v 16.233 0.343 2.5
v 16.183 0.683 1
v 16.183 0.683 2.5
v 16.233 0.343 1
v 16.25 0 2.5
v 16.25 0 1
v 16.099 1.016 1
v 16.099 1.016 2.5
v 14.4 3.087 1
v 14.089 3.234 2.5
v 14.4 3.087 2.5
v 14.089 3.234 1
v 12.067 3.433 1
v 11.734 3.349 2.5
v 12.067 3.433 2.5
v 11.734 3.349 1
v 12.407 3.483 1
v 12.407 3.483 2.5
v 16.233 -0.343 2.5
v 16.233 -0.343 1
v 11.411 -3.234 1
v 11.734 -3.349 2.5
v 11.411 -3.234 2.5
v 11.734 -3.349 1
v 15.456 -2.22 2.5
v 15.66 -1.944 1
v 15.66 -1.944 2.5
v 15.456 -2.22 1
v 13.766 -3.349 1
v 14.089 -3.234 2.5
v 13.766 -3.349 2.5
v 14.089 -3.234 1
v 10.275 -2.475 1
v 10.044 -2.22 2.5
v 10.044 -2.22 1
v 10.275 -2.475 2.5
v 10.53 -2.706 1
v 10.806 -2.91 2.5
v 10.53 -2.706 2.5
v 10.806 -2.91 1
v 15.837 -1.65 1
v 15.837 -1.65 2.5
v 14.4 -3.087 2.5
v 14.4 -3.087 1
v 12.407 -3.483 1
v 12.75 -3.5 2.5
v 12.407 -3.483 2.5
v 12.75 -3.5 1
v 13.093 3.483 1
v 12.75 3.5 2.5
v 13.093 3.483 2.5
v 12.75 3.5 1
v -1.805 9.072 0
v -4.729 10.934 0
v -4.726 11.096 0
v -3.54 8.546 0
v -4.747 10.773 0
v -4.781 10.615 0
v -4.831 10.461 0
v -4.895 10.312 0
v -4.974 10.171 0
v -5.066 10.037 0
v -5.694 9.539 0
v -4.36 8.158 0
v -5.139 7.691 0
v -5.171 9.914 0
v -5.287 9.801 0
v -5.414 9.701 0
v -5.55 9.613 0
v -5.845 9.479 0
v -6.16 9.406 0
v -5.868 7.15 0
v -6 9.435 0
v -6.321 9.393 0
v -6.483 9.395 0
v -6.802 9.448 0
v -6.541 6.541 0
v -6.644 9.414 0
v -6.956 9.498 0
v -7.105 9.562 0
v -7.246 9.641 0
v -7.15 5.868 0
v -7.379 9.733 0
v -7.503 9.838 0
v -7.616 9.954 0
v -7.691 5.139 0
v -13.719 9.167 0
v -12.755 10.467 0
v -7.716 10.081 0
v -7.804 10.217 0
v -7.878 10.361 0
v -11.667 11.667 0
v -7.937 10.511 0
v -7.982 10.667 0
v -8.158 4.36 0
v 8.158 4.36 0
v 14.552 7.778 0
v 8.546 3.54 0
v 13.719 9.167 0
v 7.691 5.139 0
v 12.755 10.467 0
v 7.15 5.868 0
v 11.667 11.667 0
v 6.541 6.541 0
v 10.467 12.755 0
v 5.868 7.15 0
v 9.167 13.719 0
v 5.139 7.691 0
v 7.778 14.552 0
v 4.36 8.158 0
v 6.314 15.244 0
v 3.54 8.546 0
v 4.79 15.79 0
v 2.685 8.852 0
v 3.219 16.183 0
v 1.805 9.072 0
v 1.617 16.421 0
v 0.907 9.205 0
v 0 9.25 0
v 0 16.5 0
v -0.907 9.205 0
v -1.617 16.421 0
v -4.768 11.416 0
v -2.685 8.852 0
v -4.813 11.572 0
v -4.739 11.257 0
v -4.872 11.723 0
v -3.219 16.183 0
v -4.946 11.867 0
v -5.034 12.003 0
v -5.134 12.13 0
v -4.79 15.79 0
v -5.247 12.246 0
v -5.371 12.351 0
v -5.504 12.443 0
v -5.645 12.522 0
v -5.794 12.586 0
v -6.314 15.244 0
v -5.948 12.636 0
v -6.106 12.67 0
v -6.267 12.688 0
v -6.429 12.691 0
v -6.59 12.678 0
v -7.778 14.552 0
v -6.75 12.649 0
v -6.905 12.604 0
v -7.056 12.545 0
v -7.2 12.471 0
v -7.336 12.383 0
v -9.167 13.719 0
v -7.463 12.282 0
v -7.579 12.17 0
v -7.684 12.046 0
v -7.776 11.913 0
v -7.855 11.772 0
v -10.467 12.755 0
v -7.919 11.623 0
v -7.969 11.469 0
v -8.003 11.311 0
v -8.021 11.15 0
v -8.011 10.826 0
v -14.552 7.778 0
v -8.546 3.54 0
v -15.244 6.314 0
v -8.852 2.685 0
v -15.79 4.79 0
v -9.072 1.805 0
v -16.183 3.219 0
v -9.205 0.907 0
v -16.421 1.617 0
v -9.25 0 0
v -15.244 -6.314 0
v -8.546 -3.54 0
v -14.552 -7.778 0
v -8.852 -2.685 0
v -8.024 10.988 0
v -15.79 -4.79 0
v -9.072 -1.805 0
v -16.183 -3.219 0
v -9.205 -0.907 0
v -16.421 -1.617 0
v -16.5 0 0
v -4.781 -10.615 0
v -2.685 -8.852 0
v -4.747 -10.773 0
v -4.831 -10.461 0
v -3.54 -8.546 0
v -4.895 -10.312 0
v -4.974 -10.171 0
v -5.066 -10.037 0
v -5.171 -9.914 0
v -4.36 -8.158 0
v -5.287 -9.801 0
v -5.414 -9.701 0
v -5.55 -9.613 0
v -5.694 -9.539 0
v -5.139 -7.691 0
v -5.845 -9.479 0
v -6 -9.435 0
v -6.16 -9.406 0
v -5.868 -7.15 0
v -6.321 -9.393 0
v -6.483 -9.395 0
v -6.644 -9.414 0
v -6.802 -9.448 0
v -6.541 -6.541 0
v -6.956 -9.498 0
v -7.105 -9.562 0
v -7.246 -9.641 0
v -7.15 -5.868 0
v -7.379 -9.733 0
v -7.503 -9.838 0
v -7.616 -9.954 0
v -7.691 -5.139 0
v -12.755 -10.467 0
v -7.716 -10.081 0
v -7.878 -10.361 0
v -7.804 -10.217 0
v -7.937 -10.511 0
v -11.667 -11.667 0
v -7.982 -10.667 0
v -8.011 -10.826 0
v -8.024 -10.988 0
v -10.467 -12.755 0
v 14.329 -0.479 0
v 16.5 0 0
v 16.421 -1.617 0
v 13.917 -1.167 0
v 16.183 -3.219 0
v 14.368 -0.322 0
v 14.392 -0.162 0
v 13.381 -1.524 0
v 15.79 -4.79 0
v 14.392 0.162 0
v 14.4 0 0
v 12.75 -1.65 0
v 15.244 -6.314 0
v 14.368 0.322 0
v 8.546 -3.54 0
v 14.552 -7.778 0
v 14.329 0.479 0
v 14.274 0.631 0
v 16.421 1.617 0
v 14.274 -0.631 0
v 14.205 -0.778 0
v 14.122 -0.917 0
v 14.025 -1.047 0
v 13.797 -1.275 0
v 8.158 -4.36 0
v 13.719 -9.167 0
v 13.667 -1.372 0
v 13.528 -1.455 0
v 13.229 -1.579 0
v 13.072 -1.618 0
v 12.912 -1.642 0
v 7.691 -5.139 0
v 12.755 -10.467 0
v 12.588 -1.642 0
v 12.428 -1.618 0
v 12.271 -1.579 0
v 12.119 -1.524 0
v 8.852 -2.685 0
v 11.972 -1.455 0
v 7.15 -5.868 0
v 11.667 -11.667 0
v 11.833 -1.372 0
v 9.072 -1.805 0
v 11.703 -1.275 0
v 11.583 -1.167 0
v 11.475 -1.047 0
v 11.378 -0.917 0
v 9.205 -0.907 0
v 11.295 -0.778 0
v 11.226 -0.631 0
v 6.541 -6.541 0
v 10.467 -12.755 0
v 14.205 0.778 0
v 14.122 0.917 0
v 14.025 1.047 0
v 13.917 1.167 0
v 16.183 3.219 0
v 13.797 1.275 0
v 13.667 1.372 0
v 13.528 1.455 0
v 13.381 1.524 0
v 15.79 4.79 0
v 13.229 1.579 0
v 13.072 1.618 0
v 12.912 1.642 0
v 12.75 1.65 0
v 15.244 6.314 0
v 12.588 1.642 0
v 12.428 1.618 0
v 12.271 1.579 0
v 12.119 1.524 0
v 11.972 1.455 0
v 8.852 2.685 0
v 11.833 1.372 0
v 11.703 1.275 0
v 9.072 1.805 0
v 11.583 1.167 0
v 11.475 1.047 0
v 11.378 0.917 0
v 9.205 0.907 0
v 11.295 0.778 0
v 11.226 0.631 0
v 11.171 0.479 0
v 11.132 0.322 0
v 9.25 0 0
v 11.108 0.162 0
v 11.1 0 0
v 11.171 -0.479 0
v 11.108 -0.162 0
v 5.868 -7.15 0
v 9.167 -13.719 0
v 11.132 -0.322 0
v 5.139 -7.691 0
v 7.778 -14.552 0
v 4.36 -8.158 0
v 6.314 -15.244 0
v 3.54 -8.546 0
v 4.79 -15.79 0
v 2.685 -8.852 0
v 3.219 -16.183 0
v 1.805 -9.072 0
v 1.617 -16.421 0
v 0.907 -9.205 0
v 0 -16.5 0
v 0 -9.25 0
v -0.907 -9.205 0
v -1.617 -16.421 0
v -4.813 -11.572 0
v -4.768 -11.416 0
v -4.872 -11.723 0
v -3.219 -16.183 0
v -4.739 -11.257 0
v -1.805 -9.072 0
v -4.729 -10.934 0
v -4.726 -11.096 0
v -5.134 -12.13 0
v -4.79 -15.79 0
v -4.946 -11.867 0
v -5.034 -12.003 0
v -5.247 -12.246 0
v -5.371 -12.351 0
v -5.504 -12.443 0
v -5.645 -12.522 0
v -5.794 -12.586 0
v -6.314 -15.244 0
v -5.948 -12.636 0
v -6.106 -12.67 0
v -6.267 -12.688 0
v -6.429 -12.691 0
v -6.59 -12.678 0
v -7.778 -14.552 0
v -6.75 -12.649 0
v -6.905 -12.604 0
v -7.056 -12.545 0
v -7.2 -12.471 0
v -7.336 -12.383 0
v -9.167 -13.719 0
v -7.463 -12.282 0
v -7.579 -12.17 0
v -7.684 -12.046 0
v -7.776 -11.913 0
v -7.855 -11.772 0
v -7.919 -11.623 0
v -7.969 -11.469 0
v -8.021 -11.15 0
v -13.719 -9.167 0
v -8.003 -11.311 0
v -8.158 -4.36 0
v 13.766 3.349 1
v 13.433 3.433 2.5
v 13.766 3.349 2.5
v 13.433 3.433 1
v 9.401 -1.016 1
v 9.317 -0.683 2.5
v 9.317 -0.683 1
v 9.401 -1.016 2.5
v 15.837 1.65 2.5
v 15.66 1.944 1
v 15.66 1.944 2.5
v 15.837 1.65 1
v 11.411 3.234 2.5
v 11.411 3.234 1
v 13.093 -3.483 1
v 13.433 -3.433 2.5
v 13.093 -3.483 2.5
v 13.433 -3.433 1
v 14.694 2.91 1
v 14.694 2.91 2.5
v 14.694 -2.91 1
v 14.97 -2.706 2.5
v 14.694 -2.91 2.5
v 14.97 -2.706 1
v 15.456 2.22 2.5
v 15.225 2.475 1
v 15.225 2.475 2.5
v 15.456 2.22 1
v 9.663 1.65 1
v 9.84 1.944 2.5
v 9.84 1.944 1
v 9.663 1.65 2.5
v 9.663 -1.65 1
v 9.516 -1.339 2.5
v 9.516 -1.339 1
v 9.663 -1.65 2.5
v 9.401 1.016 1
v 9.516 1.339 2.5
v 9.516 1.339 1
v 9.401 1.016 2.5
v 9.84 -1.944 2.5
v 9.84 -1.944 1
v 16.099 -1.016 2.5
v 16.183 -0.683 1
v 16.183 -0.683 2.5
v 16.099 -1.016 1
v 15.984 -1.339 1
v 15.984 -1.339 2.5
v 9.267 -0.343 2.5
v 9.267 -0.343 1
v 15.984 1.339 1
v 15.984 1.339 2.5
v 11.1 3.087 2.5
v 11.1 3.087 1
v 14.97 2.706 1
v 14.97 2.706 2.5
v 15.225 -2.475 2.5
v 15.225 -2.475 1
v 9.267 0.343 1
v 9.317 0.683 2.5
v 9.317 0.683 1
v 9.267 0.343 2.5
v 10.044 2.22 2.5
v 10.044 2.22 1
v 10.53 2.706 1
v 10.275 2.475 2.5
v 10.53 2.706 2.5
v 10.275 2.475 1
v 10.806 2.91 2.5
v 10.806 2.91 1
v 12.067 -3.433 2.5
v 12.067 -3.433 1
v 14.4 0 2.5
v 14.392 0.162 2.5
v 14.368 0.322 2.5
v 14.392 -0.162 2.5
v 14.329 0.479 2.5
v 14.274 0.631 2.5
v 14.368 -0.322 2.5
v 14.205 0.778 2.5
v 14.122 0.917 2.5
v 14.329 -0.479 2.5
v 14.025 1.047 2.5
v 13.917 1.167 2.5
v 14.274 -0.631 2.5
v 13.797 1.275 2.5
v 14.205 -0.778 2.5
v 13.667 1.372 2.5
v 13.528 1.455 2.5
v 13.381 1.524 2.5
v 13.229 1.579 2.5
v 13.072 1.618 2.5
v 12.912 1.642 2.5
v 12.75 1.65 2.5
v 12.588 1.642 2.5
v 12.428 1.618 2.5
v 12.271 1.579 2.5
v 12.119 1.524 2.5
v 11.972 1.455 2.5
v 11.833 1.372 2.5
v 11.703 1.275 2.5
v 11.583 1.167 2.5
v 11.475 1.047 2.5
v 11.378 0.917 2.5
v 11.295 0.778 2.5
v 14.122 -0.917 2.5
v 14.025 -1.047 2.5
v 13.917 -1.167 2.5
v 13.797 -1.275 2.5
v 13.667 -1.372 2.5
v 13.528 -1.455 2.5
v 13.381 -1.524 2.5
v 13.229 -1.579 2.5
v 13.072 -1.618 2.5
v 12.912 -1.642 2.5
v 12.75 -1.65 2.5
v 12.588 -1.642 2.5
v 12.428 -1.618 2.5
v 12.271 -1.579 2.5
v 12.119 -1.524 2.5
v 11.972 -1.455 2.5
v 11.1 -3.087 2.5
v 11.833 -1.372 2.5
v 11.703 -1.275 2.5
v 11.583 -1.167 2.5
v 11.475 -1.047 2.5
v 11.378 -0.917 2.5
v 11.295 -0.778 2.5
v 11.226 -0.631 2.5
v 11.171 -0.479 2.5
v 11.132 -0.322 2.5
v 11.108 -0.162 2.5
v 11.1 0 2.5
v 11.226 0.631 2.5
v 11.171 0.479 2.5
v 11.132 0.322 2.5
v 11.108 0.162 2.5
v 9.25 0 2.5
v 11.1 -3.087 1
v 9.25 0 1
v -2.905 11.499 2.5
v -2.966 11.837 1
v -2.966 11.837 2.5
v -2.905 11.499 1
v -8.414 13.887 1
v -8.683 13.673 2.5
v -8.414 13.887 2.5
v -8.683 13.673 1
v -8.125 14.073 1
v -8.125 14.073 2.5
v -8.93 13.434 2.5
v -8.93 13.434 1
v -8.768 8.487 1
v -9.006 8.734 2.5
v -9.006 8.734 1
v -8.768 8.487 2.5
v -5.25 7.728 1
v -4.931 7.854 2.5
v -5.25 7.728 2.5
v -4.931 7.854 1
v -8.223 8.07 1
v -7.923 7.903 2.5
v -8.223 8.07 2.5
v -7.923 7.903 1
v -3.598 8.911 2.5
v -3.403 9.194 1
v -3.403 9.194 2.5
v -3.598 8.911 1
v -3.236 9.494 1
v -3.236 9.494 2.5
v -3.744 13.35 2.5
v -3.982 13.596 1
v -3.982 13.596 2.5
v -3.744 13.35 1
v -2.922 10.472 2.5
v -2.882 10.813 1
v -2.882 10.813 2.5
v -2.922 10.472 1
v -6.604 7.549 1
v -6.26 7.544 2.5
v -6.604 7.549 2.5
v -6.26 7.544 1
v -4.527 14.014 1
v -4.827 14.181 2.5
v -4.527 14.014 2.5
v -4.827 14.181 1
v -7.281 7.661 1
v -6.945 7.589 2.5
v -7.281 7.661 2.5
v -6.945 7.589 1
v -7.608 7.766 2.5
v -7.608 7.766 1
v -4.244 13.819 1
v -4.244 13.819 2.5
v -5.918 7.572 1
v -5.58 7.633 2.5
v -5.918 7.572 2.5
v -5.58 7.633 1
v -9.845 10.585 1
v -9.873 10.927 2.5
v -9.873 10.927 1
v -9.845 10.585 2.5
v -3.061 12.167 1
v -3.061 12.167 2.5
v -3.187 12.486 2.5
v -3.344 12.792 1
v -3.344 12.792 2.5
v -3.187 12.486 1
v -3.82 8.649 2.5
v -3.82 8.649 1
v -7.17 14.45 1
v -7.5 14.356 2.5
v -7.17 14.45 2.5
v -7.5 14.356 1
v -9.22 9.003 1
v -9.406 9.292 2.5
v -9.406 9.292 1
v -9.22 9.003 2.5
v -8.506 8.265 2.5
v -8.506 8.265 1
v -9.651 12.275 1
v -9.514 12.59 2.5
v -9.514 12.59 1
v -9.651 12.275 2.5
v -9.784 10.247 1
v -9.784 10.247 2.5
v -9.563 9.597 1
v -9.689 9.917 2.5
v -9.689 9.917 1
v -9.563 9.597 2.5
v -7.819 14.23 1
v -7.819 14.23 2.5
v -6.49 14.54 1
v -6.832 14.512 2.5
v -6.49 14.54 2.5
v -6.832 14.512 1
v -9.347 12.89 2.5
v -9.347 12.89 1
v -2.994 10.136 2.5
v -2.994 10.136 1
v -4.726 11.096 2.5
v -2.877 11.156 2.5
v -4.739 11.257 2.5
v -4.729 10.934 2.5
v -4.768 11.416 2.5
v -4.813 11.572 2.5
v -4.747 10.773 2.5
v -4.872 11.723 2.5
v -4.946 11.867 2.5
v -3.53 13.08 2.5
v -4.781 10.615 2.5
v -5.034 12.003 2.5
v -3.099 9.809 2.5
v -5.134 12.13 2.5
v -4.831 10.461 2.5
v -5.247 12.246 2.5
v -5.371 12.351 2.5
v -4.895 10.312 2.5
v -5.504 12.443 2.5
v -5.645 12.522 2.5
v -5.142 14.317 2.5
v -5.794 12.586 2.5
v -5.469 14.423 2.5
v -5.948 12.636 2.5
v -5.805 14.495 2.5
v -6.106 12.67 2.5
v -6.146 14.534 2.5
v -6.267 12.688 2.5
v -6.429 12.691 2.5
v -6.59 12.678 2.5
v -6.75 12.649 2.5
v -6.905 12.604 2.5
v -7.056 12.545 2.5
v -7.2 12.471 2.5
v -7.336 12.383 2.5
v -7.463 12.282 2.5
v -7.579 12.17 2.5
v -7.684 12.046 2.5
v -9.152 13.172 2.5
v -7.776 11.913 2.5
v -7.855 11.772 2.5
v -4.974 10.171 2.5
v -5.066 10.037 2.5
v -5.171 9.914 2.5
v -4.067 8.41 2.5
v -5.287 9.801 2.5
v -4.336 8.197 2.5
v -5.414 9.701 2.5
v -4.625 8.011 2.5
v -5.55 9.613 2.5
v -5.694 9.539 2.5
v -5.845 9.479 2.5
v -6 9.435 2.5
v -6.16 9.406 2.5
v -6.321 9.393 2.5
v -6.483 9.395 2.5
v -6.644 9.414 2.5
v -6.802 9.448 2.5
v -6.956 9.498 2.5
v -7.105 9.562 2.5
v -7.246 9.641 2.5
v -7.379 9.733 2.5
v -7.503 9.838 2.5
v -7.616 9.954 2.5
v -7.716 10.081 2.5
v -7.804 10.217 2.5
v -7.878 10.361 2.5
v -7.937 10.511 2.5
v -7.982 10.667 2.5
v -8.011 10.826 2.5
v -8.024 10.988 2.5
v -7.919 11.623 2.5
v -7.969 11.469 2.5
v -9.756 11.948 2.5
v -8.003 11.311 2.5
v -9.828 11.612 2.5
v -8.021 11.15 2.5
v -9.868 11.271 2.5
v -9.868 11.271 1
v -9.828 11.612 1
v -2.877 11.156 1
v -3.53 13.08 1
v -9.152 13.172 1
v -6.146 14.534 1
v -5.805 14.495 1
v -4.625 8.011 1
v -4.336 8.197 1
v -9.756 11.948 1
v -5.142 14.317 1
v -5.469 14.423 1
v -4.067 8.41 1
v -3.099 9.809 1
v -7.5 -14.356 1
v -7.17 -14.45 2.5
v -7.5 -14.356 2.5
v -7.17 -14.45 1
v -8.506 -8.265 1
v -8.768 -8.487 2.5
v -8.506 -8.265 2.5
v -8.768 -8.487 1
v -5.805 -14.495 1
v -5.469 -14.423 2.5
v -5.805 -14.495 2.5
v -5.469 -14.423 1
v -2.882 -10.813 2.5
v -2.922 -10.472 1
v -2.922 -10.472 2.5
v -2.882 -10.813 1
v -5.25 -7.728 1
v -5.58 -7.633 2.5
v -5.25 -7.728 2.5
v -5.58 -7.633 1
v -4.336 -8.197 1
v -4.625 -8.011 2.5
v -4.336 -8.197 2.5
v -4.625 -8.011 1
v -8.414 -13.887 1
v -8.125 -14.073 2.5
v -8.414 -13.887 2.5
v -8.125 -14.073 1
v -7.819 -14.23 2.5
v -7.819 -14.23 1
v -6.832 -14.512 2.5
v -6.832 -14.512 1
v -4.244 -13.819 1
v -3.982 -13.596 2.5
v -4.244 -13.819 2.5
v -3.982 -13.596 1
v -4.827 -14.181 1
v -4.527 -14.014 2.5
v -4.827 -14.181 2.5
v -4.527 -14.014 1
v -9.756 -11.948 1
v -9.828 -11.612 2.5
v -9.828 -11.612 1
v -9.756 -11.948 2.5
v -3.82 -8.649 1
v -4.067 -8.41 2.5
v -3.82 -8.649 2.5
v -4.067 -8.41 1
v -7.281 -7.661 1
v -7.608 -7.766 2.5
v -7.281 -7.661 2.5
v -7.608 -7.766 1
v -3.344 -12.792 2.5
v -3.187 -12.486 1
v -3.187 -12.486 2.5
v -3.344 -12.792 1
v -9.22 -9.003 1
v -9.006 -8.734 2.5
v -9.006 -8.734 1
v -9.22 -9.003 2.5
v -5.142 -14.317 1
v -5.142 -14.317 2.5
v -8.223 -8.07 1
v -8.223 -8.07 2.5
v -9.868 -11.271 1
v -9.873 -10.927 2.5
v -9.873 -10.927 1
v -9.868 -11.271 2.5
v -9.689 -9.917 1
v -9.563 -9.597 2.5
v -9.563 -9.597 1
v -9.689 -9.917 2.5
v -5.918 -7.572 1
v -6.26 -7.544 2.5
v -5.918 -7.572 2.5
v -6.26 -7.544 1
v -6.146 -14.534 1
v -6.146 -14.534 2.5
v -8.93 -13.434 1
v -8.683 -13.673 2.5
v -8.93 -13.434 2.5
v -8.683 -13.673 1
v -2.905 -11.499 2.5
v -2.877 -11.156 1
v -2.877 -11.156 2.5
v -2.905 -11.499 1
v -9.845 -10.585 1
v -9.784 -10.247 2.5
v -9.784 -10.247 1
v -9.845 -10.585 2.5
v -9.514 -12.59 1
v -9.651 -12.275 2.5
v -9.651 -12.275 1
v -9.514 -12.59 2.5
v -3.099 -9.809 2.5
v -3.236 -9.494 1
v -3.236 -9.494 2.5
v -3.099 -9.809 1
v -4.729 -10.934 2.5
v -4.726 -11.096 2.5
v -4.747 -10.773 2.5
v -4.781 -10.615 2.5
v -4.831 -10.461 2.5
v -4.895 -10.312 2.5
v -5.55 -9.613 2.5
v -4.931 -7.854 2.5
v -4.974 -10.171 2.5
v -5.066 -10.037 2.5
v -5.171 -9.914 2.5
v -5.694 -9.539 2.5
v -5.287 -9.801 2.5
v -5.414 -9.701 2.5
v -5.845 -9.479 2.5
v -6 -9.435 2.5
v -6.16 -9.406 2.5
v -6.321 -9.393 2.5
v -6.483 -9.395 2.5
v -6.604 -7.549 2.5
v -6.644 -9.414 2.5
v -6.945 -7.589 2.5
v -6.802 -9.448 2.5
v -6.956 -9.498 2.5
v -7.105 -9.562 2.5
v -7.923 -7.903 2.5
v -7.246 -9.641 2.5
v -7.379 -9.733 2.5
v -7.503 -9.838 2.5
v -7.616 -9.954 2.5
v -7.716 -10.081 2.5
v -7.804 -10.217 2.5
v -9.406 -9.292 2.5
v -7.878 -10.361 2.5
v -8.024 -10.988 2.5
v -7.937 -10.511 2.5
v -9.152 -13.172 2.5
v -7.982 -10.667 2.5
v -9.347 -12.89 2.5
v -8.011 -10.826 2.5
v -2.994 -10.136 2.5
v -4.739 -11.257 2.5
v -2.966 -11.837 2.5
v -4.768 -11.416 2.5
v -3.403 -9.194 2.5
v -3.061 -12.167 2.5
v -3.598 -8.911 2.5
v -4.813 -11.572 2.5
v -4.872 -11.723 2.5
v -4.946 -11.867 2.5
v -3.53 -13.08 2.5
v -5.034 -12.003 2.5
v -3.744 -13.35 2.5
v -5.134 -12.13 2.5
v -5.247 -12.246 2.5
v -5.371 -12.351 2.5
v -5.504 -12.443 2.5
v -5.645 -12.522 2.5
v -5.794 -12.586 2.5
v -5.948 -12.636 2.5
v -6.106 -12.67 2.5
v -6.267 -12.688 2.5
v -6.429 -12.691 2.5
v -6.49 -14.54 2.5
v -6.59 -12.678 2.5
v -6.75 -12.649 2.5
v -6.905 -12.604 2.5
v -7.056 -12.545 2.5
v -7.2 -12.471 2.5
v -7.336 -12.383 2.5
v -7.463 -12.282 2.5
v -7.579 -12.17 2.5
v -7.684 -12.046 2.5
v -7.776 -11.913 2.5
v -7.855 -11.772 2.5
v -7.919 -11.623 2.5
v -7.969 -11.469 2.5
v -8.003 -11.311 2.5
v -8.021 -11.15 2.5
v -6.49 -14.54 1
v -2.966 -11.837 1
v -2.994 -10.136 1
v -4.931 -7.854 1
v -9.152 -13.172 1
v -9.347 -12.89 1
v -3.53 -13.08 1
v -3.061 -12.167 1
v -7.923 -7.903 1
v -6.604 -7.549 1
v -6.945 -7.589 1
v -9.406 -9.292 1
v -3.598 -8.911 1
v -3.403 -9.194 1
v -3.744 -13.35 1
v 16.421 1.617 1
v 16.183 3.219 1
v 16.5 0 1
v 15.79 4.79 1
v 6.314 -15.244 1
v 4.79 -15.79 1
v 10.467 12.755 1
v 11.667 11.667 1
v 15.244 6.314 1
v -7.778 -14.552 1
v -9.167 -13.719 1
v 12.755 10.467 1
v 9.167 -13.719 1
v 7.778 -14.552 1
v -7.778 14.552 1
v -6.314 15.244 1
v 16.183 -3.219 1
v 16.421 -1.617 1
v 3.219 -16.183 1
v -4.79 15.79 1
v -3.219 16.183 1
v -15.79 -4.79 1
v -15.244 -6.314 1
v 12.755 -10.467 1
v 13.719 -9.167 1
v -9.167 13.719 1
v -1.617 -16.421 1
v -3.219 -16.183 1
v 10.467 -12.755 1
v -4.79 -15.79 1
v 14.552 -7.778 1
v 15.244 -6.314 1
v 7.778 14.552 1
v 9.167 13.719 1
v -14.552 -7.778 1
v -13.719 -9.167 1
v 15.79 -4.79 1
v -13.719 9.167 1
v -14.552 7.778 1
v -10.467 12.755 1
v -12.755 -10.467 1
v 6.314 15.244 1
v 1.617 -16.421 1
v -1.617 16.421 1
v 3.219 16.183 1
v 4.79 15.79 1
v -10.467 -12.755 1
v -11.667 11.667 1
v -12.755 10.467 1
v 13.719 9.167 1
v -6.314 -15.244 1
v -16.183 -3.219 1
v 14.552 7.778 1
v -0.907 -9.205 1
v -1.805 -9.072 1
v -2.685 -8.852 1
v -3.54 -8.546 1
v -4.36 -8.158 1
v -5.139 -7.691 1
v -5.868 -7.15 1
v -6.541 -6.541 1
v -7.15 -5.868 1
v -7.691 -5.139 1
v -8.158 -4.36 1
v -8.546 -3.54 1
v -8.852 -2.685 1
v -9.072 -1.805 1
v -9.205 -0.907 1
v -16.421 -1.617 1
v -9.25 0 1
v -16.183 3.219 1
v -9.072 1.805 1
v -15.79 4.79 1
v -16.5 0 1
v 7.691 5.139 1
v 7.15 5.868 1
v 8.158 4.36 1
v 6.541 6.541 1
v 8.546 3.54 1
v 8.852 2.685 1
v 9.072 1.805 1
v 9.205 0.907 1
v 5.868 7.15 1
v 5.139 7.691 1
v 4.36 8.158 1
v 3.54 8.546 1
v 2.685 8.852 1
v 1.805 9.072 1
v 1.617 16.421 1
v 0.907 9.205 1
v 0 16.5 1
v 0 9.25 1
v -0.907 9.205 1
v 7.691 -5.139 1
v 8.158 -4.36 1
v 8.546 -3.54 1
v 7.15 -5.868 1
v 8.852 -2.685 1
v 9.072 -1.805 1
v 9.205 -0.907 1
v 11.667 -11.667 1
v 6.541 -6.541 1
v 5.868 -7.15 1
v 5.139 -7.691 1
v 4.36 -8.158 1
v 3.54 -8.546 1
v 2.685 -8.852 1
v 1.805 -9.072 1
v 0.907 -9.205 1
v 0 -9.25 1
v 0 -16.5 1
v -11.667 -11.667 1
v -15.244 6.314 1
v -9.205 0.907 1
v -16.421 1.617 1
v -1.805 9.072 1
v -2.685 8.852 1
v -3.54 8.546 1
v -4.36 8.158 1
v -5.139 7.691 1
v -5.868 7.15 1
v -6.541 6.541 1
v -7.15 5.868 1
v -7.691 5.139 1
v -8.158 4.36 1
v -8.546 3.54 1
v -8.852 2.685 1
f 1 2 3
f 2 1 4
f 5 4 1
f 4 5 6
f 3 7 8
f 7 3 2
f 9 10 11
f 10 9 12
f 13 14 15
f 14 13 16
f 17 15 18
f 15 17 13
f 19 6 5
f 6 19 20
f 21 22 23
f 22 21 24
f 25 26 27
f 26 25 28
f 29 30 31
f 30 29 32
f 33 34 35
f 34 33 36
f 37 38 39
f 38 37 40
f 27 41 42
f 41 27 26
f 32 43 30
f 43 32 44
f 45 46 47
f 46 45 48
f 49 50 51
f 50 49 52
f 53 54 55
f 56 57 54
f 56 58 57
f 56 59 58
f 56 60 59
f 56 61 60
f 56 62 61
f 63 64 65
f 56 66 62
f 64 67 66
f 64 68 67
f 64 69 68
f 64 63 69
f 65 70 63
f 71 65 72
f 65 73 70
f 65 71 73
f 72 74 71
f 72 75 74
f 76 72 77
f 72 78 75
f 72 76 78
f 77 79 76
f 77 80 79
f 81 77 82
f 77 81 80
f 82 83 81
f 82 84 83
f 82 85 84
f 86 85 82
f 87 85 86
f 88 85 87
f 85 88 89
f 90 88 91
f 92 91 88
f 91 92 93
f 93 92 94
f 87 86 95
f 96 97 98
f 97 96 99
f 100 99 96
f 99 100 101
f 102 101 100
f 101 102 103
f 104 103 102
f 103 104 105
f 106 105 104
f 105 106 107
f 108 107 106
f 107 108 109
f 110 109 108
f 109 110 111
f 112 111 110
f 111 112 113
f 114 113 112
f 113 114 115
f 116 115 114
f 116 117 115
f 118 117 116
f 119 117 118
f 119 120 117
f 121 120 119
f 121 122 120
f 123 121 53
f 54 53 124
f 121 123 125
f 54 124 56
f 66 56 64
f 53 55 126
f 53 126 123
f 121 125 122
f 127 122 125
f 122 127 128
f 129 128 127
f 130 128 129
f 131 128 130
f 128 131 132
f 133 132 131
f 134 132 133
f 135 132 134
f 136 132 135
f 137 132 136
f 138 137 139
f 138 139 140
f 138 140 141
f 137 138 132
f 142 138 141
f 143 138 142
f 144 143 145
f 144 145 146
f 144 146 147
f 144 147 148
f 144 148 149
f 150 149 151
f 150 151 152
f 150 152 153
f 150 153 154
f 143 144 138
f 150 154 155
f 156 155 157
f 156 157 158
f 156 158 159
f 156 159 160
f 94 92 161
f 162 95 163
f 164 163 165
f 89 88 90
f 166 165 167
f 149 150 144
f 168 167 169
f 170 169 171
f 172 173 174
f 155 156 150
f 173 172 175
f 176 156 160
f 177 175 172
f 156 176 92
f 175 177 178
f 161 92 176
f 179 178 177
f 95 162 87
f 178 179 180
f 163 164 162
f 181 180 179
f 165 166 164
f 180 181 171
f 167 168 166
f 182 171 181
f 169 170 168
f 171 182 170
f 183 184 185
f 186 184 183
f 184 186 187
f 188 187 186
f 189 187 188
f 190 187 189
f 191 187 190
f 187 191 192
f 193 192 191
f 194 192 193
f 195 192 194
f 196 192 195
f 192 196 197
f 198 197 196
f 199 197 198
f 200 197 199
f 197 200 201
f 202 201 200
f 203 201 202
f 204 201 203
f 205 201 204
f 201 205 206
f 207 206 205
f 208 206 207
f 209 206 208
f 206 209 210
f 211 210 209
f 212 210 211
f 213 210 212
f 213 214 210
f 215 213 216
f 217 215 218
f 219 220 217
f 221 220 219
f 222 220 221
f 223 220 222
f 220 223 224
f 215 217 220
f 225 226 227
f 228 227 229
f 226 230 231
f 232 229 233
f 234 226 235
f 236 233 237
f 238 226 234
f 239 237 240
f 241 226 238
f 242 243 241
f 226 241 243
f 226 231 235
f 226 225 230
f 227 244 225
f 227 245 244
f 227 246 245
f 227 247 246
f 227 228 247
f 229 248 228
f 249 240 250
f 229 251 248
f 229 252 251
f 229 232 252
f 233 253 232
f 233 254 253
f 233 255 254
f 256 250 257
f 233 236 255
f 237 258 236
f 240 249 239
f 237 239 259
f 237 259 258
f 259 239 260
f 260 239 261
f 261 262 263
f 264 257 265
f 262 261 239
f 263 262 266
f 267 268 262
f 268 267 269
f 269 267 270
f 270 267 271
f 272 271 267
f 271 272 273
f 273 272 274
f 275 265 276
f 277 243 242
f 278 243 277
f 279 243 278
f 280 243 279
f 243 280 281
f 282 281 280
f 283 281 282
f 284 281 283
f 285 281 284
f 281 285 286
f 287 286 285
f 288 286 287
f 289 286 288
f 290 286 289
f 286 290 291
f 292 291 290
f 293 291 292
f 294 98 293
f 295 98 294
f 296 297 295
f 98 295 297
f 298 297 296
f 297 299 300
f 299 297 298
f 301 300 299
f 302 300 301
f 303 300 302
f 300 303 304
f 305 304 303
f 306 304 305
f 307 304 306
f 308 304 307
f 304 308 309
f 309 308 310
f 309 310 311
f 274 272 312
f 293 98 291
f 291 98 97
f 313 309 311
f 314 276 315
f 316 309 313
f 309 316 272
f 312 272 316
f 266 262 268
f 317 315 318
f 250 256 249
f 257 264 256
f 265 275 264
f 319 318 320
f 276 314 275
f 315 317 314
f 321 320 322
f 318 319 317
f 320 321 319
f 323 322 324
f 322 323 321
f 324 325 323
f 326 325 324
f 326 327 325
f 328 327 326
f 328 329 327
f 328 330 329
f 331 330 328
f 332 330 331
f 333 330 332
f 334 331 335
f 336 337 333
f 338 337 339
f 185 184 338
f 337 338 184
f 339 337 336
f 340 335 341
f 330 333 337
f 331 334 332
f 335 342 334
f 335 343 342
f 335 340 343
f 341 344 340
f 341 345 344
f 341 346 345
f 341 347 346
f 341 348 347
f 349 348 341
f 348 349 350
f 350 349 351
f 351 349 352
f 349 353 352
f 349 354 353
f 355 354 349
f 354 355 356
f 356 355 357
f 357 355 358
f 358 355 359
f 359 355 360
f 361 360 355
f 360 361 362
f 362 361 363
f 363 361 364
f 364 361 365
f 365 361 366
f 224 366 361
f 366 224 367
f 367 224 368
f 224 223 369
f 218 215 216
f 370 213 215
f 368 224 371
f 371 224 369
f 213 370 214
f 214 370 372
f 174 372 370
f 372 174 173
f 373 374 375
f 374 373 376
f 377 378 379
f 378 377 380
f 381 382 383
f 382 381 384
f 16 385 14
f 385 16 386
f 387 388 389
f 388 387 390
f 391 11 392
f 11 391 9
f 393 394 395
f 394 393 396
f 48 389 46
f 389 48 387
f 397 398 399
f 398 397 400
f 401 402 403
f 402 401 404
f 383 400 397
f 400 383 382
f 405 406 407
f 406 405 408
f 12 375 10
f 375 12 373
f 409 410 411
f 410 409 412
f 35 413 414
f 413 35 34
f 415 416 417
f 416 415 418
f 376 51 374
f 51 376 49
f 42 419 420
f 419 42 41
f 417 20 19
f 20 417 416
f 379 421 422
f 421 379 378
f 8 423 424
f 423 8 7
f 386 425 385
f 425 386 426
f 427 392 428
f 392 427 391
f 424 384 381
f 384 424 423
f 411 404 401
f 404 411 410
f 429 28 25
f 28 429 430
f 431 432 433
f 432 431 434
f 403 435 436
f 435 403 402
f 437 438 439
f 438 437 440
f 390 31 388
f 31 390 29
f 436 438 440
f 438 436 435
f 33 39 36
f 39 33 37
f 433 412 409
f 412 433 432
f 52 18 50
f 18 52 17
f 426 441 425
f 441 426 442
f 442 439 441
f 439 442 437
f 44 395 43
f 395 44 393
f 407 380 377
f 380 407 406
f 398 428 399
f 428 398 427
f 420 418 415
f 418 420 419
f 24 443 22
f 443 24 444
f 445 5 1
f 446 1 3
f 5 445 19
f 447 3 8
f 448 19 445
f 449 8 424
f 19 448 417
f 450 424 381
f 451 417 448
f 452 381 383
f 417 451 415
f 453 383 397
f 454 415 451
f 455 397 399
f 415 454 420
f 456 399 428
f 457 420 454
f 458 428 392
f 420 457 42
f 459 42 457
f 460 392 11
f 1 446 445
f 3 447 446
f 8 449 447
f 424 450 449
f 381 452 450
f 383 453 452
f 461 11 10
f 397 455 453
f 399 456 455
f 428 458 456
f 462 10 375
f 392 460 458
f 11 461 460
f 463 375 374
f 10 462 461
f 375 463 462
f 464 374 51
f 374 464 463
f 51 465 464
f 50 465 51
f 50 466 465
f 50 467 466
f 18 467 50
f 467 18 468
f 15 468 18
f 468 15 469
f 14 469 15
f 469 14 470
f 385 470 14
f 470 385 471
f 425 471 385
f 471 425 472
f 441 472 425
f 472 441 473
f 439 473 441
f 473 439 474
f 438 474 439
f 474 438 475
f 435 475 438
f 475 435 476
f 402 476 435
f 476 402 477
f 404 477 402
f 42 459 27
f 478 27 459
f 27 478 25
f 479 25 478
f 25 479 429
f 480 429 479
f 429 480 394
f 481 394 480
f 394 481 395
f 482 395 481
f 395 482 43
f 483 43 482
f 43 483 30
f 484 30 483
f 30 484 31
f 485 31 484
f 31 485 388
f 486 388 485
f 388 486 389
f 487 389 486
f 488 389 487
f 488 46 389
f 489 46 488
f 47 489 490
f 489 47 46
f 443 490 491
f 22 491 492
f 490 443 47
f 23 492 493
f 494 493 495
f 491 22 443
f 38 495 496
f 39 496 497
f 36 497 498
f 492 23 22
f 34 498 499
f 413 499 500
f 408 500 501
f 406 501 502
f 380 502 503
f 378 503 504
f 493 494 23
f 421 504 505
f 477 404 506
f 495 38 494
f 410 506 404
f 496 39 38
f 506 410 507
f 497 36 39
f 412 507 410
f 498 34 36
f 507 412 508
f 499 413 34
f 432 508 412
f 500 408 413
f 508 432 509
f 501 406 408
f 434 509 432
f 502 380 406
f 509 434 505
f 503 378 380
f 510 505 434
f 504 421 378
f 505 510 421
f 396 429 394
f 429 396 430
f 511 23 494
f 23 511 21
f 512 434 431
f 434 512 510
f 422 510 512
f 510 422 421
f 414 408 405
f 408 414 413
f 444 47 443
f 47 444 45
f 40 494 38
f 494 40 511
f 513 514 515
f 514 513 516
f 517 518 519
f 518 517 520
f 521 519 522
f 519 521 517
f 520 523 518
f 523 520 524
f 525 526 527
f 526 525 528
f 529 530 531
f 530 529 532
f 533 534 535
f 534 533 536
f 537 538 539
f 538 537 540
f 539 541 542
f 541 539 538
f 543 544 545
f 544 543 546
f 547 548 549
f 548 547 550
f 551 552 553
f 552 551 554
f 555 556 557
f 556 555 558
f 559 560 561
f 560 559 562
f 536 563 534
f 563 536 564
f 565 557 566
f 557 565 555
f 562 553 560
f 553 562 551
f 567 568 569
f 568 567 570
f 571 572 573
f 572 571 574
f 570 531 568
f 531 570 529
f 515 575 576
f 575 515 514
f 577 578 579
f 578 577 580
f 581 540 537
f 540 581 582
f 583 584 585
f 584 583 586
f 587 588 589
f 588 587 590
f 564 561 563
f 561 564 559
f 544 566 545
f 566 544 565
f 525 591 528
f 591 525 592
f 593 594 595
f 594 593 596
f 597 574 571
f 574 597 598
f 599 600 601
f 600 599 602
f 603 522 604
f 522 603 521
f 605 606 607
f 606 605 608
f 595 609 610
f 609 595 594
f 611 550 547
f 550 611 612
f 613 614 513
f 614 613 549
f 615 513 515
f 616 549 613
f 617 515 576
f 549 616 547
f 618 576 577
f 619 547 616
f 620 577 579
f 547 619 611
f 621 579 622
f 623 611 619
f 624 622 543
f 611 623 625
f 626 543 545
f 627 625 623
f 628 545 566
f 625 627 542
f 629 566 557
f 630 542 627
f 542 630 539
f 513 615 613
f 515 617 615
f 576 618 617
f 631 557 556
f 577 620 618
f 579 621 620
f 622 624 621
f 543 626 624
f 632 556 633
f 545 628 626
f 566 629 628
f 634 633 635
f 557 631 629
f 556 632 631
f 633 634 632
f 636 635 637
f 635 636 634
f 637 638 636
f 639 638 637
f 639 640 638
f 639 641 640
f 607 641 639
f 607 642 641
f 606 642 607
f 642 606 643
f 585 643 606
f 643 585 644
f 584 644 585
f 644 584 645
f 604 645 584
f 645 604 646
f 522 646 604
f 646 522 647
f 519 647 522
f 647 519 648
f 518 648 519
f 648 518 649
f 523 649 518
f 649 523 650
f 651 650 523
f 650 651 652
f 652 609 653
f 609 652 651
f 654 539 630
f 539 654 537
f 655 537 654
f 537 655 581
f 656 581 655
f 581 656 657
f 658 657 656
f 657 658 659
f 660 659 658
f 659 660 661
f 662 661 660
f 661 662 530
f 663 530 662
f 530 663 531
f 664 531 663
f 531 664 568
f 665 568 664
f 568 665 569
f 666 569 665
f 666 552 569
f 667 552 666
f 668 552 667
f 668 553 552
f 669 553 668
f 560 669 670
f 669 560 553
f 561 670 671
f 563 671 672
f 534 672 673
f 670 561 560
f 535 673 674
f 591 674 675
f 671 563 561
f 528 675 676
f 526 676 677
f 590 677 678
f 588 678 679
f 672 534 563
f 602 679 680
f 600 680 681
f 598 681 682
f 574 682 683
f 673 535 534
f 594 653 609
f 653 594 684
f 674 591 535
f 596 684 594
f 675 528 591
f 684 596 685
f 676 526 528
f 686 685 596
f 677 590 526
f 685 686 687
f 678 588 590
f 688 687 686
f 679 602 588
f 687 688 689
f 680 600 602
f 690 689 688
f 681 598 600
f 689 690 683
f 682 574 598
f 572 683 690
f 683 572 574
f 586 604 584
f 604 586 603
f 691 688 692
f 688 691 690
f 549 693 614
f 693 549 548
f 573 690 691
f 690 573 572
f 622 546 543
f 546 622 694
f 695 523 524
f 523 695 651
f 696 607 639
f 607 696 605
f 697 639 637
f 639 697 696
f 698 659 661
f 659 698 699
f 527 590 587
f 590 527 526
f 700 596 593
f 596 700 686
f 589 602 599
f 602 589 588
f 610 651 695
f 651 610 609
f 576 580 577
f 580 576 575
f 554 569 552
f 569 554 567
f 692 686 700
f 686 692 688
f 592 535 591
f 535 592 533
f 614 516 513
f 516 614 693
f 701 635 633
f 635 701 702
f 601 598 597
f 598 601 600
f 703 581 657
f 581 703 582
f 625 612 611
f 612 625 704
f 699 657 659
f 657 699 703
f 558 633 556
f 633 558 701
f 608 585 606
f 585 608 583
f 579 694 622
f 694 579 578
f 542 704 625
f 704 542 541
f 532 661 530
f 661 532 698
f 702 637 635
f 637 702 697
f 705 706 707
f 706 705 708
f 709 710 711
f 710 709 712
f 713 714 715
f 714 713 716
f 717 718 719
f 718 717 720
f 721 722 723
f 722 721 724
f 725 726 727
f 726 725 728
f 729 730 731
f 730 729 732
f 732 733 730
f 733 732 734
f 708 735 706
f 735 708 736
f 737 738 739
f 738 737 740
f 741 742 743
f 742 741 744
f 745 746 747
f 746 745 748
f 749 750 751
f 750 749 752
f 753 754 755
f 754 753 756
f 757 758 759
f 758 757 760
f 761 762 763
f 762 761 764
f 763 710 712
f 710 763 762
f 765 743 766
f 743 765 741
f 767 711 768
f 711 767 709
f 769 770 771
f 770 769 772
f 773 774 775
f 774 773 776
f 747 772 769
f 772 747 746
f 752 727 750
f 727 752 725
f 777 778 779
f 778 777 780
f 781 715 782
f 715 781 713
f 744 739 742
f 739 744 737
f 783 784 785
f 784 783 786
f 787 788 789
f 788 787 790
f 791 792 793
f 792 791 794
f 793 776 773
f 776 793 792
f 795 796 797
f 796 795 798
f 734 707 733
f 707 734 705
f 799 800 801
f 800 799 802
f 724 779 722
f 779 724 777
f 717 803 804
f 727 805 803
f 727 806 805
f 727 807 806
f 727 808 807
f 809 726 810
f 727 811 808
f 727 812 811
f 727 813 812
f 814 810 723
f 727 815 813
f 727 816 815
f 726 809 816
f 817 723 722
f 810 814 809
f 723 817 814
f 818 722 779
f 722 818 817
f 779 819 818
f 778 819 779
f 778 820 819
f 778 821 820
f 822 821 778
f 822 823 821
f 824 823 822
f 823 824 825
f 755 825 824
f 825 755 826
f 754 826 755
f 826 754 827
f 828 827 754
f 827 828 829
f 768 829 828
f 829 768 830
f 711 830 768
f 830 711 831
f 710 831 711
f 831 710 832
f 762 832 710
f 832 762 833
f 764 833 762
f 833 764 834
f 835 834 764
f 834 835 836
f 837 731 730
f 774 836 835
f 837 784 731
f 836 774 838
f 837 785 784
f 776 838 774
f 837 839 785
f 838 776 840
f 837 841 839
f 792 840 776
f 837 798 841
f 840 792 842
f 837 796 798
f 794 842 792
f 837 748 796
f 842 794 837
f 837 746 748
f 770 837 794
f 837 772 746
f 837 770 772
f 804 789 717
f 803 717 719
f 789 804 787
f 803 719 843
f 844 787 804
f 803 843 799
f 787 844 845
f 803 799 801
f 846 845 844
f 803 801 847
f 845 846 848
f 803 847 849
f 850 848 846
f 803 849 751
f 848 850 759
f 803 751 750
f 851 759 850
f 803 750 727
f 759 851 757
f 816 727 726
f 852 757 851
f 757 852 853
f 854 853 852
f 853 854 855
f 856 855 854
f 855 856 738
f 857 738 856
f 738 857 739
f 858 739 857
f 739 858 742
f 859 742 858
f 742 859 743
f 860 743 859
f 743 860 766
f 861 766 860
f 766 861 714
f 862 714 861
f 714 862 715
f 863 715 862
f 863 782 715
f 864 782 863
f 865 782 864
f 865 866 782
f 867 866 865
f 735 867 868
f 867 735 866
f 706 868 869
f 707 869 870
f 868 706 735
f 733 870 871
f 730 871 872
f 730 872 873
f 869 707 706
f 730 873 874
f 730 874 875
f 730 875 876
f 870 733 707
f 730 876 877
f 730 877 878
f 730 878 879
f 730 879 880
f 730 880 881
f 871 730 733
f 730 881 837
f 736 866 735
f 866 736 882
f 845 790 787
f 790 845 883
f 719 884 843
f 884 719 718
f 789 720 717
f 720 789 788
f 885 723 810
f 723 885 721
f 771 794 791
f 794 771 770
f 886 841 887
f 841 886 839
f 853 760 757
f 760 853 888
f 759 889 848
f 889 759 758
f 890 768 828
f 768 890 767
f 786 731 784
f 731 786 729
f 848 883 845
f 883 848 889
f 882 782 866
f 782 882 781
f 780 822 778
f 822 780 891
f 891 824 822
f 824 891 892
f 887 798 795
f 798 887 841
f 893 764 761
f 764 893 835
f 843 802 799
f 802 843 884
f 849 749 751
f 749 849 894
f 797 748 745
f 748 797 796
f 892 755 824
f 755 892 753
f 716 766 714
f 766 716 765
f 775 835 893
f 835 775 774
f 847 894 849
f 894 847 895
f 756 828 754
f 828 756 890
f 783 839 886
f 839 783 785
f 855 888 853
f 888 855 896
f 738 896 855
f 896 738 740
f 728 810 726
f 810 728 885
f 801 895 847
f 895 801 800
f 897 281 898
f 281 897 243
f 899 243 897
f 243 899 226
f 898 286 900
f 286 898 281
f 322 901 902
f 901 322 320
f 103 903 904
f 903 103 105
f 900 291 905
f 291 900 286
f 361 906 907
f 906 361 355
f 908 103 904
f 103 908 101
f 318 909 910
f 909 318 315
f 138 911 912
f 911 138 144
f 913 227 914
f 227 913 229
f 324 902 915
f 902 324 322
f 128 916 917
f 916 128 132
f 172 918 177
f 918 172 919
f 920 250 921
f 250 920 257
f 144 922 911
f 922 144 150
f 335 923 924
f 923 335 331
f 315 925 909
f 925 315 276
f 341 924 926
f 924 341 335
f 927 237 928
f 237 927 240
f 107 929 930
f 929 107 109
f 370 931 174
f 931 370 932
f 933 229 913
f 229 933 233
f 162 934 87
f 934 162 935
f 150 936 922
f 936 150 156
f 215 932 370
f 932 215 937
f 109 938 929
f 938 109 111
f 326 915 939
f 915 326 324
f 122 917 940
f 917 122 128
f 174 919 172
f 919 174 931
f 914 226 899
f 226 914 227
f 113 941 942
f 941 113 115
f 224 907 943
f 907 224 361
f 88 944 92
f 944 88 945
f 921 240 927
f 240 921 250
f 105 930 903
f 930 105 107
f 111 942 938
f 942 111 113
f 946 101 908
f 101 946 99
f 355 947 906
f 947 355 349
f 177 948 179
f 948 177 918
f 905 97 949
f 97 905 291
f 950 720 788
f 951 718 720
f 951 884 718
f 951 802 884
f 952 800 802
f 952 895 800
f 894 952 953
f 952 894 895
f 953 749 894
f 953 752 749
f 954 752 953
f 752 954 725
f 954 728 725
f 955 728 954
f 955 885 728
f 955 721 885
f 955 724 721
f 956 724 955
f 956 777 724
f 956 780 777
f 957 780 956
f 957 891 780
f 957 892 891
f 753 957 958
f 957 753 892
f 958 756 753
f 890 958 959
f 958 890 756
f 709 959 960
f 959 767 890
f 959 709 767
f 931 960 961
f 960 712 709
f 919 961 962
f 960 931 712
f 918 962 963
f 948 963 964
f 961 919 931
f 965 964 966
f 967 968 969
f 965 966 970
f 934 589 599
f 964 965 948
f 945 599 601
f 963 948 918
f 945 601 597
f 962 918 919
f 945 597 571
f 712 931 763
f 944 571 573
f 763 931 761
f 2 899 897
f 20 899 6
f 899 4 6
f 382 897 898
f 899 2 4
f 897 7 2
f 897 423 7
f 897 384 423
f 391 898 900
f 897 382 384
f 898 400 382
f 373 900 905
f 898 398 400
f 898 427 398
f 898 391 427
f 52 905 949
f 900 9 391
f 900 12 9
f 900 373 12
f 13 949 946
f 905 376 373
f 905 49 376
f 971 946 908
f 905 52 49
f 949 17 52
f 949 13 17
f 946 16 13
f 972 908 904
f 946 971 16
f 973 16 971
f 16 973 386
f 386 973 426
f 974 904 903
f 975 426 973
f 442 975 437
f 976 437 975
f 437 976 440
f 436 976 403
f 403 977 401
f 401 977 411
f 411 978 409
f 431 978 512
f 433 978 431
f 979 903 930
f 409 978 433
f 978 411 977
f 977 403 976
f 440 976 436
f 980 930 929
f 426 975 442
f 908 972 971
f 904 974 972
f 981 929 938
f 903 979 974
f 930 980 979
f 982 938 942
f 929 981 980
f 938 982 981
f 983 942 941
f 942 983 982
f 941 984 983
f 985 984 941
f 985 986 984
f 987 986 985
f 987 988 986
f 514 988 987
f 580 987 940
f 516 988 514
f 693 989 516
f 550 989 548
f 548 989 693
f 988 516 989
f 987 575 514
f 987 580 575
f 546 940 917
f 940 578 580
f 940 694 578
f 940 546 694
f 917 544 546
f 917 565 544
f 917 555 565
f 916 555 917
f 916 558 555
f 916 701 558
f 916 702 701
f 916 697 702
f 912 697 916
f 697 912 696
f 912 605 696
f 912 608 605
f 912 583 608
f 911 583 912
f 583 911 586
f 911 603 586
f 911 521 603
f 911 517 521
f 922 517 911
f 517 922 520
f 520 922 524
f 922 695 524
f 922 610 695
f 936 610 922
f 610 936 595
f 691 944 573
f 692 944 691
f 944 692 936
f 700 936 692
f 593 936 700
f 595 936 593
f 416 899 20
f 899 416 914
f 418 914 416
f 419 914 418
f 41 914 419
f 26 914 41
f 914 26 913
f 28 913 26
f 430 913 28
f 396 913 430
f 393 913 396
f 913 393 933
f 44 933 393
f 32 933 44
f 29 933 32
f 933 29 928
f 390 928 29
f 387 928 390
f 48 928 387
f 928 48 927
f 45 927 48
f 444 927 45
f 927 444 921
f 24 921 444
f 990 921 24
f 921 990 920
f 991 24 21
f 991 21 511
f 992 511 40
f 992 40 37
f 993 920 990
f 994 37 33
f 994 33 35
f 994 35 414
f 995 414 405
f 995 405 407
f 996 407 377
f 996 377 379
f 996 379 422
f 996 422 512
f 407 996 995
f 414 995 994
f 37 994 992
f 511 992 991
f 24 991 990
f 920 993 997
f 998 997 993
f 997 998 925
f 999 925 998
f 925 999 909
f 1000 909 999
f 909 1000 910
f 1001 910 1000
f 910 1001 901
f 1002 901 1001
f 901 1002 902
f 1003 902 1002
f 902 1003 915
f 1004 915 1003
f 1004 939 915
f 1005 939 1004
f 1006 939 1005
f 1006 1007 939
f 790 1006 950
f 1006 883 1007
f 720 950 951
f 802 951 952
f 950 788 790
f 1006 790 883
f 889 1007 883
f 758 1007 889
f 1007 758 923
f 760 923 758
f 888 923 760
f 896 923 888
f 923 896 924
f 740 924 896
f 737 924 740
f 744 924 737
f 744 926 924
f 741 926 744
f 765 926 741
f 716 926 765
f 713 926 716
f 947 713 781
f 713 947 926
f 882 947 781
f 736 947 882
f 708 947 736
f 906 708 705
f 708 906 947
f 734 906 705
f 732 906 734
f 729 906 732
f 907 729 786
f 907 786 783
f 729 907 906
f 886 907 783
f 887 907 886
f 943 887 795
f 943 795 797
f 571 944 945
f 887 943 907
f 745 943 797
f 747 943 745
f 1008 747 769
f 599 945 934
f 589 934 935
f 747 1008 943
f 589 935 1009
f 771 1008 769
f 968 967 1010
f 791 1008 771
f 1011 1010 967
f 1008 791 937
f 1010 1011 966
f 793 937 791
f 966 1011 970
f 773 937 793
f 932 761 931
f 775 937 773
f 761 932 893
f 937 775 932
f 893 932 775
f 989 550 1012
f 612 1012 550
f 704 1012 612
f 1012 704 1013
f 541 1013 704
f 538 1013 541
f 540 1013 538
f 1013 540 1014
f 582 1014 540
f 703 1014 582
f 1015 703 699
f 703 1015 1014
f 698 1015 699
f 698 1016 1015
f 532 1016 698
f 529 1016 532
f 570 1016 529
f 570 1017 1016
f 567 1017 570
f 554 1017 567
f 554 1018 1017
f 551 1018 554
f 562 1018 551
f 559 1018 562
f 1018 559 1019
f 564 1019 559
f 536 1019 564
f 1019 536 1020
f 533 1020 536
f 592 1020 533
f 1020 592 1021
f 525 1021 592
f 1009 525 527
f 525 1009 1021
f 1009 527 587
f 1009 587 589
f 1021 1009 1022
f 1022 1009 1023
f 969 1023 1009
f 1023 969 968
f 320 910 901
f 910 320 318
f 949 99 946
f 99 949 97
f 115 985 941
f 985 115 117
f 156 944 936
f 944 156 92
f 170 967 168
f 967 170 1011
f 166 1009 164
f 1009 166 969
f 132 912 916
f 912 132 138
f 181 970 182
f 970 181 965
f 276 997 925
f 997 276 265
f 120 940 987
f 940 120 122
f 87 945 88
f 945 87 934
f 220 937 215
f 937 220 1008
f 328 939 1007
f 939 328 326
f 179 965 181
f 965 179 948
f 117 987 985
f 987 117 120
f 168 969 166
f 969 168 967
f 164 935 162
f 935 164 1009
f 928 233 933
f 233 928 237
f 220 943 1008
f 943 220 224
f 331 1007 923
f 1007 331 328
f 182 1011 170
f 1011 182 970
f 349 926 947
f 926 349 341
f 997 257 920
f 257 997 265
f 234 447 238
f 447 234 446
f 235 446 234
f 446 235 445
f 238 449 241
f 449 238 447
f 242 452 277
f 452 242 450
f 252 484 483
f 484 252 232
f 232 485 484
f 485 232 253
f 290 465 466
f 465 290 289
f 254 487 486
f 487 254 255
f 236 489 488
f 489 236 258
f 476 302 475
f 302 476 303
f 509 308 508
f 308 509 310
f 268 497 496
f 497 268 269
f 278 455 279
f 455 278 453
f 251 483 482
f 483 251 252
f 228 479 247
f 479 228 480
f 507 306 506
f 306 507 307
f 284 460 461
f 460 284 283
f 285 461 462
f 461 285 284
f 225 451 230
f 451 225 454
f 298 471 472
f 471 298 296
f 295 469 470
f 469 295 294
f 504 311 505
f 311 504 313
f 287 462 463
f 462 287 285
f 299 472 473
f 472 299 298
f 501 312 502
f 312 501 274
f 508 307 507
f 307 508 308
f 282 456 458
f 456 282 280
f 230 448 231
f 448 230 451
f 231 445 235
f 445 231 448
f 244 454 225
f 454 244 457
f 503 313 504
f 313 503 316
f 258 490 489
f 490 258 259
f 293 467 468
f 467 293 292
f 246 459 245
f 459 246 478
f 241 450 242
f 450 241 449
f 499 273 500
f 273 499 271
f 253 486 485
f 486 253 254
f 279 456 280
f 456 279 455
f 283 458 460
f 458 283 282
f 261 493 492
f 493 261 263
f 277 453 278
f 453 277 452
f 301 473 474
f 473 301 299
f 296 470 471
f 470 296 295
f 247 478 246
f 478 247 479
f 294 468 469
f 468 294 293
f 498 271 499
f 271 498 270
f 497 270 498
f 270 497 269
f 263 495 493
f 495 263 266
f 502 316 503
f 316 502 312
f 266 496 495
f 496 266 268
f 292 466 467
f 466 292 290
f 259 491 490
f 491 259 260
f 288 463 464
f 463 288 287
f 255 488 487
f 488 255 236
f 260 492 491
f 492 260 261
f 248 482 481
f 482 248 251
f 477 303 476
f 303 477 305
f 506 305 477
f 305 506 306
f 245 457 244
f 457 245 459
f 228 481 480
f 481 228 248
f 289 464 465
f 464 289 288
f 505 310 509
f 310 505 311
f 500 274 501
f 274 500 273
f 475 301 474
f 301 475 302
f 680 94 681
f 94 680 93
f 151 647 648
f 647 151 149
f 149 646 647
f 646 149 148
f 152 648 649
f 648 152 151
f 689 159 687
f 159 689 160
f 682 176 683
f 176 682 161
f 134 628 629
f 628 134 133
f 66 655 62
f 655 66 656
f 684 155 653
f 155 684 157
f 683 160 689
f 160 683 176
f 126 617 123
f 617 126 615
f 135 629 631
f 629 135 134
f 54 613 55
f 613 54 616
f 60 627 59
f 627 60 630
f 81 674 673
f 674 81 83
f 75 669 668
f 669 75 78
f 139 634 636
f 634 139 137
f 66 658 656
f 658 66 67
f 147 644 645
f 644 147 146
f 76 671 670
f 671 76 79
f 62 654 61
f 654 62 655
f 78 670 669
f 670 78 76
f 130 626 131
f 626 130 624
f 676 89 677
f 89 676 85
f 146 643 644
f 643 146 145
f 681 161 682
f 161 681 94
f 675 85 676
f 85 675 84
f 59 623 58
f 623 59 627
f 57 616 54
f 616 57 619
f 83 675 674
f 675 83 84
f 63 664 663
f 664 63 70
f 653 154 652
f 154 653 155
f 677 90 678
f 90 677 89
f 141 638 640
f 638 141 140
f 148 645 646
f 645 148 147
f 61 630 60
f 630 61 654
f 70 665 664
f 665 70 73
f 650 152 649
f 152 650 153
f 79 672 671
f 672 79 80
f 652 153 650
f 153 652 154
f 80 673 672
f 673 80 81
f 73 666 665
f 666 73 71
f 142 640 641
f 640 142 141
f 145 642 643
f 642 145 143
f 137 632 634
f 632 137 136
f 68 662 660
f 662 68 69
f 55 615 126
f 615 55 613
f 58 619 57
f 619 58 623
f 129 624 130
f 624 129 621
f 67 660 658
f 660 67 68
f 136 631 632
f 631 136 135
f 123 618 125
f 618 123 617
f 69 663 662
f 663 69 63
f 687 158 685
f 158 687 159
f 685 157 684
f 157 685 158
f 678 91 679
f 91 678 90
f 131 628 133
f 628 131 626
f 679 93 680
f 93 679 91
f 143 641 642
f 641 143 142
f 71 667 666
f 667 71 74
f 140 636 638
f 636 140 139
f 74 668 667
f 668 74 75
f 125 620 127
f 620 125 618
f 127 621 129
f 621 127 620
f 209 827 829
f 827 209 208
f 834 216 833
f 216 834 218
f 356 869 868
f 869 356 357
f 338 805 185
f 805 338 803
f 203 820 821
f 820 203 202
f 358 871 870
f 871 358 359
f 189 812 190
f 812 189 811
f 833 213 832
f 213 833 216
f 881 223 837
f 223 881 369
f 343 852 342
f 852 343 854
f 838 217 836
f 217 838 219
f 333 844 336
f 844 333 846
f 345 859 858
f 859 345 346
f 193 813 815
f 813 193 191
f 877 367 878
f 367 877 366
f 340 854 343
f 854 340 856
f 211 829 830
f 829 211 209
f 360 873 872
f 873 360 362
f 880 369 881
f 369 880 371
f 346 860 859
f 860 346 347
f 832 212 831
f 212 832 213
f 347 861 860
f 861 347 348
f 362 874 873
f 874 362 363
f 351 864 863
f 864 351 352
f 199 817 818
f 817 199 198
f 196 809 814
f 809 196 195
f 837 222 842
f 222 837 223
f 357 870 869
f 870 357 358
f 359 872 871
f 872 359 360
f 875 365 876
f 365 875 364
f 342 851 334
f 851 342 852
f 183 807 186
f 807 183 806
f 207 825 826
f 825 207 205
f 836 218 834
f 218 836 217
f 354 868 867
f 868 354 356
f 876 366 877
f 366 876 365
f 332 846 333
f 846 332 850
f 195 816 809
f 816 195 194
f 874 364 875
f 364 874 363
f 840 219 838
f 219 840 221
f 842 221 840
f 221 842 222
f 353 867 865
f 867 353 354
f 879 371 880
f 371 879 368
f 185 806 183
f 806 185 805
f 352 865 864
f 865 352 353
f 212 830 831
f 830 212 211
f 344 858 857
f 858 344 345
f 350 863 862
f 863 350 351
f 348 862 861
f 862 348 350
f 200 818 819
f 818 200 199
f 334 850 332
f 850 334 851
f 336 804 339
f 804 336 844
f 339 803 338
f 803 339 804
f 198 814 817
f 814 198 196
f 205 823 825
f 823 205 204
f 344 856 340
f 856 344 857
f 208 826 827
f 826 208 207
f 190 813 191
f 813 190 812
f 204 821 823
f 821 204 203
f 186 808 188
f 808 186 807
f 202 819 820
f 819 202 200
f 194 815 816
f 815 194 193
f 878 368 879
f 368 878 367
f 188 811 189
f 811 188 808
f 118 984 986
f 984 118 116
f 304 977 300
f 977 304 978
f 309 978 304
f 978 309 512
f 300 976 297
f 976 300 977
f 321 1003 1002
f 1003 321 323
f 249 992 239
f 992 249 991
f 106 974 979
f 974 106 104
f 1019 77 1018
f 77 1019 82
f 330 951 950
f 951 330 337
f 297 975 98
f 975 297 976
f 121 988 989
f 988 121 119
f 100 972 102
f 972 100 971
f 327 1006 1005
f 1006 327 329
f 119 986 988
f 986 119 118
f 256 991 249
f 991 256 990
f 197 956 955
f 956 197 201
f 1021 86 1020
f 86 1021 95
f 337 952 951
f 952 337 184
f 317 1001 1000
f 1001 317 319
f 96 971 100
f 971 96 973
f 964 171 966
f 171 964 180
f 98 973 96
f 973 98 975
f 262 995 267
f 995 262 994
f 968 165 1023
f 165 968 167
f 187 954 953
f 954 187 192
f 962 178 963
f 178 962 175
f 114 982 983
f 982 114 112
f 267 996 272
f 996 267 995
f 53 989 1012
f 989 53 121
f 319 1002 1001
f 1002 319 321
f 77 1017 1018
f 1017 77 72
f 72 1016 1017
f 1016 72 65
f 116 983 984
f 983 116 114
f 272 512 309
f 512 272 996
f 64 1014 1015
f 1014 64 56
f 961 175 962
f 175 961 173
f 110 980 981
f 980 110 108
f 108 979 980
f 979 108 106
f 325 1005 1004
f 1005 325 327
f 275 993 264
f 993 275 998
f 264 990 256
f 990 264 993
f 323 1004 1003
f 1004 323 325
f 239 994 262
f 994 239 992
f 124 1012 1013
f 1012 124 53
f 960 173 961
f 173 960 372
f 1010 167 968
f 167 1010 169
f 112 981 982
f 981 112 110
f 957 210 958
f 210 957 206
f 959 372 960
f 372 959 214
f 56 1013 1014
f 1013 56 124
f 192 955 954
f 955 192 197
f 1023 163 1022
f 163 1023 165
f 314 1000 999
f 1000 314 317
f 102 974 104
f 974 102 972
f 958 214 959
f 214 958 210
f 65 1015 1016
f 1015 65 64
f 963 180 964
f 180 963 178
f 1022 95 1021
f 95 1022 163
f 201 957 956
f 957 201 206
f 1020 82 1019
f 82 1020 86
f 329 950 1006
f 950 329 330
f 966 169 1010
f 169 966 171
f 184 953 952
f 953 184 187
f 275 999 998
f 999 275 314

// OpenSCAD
$fn=64;

module fussADD(rot, height)
{
	rotate(a=rot, v=[0,0,1])
		translate([12.75,0,0])
		{
			cylinder(r=3.5, h=height);
		}
}
module fussDIV(rot, height, hole=1.65)
{
	rotate(a=rot, v=[0,0,1])
		translate([12.75,0,0])
		{
			cylinder(r=hole, h=height);
		}
}


module top()
{
	difference()
	{
		union()
		{
			fussADD(0, 2.5);
			fussADD(120, 2.5);
			fussADD(240, 2.5);
			cylinder(r=16.5, h=1);
		}

		fussDIV(0, 2.5);
		fussDIV(120, 2.5);
		fussDIV(240, 2.5);
		cylinder(r=9.25, h=1);
	}
}


module bottom()
{
	difference()
	{
		union()
		{
			translate([0,0,1])
			cylinder(r2=14.65,r1=14.85, h=4.5);
			cylinder(r=20, h=1.75);
		}

		fussDIV(0, 8);
		fussDIV(120, 8);
		fussDIV(240, 8);

//			translate([12.75,0,0])
//				rotate(30, [0,0,1])
//					cylinder(r=6.5/2, h=2.25, $fn=6);


		translate([-4,14.8,1])
			cube([8,7,1]);
		translate([-4,-14.8-7,1])
			cube([8,7,1]);

		cylinder(r=10, h=8);

		translate([-9.7,-1.5,0.75])
			rotate(a=-185, v=[0,1,0])
				#cube([10,3,0.75]);
	}
	
	difference()
	{
		translate([-3-8,-3,0])
			cube([10,6,4]);
		translate([-2,-3,0])
			rotate(a=45, v=[0,1,0])
				cube([3,6,3]);
		translate([-20,-1.5,0])
			cube([20,3,0.75]);
	}

	translate([-3,-3,4])
		cube([2,6,1]);
}


top();
//bottom();
